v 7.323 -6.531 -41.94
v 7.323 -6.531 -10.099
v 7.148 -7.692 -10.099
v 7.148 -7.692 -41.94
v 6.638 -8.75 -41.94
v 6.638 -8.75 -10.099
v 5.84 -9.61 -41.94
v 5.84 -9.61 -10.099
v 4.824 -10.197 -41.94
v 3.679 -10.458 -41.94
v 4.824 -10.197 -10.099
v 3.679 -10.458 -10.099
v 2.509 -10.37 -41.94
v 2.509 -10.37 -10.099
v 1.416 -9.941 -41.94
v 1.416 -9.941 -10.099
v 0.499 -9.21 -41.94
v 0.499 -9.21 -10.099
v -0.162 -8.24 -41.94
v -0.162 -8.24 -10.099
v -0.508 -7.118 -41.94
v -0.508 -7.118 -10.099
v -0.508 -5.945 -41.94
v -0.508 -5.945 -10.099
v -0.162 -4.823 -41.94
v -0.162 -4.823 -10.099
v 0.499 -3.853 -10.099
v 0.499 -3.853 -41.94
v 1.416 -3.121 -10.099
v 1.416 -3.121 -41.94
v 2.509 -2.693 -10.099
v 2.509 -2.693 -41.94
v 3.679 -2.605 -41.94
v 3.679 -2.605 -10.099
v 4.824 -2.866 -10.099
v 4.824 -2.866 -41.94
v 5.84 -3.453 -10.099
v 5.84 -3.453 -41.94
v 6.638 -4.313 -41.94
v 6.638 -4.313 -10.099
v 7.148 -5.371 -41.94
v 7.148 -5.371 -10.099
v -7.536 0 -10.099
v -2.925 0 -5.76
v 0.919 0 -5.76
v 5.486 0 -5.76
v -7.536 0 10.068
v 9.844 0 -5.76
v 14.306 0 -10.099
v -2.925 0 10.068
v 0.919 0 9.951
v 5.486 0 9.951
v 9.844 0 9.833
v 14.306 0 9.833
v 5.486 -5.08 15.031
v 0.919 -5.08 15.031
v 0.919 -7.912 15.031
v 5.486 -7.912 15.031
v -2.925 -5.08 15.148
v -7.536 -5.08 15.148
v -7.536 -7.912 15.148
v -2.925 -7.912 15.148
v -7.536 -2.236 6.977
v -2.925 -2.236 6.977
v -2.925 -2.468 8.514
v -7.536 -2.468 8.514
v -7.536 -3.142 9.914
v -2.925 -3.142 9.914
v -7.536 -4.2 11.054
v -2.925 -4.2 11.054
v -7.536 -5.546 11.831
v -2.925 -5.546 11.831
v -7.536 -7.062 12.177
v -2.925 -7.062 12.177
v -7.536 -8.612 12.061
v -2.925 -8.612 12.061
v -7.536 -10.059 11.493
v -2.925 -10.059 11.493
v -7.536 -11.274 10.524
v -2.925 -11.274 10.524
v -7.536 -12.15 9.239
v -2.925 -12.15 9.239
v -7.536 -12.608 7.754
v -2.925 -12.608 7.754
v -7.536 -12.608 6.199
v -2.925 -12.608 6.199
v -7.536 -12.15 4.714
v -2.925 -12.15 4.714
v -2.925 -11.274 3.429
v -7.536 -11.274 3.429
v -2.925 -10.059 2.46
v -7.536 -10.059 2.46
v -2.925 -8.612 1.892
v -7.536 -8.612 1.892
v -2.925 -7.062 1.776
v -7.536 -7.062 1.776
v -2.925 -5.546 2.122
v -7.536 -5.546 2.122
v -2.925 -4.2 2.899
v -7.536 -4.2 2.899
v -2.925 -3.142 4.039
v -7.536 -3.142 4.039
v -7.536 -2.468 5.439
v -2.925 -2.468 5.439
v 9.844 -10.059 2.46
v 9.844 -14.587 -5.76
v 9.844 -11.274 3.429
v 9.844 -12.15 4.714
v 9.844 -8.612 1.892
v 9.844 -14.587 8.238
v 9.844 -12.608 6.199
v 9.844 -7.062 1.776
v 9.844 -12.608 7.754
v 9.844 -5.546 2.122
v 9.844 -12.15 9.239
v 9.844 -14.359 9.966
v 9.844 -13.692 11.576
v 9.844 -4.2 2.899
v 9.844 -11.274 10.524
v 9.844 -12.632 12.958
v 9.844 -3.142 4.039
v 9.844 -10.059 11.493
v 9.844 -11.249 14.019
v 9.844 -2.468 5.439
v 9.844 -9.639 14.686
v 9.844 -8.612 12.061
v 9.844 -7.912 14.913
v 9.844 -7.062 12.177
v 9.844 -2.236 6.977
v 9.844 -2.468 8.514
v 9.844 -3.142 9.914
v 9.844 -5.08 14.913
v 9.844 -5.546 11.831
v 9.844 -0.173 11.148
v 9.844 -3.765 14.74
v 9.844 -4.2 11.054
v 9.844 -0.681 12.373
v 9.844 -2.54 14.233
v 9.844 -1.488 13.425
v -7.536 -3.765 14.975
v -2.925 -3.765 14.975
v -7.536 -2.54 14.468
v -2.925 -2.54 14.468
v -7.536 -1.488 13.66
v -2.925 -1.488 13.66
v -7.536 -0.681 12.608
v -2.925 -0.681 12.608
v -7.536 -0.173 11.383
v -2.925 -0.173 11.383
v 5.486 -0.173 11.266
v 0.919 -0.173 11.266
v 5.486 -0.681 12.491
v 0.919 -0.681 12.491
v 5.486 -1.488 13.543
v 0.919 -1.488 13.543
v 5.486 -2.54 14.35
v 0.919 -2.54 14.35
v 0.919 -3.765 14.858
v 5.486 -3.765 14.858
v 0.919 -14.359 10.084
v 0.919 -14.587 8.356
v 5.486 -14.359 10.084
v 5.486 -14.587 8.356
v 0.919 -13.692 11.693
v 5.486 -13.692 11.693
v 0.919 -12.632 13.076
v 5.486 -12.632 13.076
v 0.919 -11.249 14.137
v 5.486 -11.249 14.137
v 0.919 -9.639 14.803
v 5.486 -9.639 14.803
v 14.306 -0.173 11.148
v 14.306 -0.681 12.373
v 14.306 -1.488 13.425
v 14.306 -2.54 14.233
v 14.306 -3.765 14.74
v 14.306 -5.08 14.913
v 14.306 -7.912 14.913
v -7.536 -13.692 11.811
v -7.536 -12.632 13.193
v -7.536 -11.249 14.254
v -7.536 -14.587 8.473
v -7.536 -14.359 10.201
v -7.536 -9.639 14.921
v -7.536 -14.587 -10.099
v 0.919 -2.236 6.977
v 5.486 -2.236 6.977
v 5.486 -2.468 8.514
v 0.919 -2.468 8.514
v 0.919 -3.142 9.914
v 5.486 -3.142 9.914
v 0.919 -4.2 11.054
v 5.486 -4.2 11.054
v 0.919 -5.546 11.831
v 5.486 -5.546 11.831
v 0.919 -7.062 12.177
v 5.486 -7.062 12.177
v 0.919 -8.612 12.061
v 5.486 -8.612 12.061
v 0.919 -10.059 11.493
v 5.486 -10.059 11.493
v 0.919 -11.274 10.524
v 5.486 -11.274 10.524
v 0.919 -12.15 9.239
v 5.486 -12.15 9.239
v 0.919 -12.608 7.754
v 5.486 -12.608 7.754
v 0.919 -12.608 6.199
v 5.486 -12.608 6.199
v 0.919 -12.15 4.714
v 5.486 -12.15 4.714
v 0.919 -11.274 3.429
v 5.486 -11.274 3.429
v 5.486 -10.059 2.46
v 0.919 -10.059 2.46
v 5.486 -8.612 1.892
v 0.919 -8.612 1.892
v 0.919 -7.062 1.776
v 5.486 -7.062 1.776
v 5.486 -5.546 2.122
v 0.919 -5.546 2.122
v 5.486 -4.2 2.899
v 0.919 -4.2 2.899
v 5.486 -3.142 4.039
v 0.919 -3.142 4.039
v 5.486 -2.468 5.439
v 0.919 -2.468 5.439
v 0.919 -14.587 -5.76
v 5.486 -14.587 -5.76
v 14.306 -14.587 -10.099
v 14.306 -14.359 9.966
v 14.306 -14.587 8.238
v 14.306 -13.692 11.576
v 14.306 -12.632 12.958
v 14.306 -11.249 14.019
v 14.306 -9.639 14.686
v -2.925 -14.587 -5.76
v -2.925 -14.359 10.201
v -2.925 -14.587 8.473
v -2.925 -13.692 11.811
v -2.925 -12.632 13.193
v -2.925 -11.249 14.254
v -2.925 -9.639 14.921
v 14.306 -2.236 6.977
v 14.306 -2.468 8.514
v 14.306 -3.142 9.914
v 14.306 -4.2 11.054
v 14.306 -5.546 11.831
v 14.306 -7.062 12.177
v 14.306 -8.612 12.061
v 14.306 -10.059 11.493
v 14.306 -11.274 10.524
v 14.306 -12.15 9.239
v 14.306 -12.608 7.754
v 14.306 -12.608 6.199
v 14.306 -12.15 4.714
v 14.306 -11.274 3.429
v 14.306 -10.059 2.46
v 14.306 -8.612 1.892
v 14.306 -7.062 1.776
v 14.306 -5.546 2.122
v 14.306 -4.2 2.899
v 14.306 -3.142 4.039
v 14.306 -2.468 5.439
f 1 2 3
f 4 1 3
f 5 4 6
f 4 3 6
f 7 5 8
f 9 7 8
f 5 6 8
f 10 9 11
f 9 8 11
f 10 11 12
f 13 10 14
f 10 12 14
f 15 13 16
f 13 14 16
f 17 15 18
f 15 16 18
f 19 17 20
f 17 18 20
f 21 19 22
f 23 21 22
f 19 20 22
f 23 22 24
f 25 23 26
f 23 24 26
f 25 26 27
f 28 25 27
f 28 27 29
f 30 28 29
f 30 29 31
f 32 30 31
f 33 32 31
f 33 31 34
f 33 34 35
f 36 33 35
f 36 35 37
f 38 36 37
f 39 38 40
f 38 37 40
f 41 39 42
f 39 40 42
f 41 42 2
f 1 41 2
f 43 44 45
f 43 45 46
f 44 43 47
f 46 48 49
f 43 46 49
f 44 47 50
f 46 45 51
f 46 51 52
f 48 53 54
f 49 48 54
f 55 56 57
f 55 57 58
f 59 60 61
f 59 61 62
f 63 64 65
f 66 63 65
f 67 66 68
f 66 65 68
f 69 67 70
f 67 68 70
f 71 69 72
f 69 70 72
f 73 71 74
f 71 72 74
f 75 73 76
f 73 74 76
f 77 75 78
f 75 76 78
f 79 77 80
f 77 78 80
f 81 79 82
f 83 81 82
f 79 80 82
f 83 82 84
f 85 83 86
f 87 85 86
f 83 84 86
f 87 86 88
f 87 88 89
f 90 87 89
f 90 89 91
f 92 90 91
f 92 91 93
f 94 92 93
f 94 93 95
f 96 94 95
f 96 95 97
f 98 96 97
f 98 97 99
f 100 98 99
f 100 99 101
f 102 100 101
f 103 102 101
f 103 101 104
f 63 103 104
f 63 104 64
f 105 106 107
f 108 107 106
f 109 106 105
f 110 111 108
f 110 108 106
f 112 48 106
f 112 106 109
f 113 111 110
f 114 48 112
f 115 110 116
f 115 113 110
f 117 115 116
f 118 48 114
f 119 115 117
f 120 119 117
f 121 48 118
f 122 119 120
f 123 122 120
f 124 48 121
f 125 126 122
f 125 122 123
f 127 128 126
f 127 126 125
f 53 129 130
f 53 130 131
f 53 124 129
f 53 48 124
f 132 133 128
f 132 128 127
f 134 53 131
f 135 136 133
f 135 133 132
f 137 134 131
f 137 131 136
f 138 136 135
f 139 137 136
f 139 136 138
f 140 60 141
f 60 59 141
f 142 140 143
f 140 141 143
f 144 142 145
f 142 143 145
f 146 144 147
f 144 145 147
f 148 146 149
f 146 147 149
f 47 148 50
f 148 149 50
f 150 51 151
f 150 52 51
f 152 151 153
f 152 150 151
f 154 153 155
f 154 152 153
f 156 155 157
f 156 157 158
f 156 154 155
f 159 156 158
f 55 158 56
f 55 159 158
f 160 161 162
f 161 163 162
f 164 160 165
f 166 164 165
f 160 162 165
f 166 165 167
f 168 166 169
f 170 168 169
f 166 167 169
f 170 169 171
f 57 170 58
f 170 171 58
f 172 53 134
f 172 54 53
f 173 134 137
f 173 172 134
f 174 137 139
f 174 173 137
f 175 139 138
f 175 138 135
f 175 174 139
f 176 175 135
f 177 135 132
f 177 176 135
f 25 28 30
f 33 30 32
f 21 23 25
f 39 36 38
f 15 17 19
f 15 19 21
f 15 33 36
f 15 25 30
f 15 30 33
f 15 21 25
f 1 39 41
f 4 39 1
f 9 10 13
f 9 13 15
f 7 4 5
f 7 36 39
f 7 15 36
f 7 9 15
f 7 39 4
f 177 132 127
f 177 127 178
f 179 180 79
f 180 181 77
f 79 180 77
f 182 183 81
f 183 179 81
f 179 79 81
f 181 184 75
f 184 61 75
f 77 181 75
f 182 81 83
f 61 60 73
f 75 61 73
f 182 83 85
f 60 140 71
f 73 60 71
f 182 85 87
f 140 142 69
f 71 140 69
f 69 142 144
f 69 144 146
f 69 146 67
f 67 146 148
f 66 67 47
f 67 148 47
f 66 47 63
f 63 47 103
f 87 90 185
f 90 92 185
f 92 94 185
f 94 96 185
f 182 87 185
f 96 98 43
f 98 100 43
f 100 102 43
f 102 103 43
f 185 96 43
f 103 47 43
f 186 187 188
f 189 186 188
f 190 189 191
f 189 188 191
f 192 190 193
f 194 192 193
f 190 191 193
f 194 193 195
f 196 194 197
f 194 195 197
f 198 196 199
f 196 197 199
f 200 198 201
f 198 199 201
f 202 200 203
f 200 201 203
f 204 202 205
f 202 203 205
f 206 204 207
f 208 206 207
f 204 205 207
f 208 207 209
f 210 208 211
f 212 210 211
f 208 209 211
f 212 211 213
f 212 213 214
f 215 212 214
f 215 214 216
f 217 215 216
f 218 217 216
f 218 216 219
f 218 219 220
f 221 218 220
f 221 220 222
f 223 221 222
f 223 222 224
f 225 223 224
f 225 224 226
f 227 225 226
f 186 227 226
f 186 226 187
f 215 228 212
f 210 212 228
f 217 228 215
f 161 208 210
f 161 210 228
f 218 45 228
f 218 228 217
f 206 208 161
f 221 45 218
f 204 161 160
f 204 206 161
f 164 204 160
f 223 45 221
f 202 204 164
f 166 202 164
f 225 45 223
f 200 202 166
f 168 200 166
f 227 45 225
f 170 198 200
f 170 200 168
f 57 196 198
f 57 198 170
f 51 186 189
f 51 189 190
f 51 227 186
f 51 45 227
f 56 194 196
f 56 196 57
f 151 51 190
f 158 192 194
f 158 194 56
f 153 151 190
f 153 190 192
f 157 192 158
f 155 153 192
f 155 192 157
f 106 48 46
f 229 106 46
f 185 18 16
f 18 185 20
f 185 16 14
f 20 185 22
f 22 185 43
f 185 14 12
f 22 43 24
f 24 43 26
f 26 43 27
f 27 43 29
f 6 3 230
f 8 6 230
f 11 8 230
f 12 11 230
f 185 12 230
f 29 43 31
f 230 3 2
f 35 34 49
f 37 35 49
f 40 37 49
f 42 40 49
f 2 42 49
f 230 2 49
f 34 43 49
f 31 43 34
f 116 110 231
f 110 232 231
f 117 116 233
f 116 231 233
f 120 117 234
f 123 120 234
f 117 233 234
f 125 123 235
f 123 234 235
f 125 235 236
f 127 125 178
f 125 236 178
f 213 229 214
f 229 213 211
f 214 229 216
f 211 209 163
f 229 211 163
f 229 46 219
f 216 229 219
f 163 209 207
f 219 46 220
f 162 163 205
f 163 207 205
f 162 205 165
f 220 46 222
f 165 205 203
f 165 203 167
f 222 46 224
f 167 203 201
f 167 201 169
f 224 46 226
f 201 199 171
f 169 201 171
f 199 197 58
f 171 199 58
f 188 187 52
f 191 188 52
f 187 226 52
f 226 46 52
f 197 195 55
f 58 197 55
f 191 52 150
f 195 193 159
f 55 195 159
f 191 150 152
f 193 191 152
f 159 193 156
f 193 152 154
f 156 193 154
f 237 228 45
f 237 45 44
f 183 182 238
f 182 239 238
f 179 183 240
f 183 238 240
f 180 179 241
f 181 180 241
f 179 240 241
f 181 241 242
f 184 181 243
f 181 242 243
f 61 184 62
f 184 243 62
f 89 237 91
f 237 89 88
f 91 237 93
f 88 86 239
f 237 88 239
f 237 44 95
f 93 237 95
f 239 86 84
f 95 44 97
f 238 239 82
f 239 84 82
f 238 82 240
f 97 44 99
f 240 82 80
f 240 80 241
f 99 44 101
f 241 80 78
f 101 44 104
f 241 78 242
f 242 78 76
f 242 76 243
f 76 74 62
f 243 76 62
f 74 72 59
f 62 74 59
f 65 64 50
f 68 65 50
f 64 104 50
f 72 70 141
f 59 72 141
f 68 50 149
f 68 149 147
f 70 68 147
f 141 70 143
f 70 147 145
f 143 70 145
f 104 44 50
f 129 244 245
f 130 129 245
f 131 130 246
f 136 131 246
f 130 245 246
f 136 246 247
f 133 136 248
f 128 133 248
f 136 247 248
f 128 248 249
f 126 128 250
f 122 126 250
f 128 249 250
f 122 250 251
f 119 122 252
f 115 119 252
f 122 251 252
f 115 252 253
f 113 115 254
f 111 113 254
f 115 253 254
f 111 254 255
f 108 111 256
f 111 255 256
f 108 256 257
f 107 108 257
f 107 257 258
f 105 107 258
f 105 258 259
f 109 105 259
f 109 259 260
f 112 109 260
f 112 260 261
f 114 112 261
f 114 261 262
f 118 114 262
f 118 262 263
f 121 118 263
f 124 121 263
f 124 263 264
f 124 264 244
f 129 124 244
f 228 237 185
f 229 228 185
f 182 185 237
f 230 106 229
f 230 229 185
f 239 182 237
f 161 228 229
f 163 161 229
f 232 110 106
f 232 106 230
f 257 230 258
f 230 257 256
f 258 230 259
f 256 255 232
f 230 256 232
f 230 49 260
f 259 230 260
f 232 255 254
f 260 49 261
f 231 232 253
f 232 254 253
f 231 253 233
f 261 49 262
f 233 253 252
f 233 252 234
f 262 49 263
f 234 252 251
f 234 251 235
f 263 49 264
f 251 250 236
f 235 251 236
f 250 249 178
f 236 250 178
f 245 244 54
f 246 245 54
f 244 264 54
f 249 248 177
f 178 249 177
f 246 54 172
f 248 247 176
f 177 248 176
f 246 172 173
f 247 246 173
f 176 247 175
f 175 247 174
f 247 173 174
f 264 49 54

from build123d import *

# Parameters (mm, degrees)
F0_W     = 4.6103289351
F0_H     = 4.3393736705
F0_W_2   = 3.8445899263
F0_H_2   = 20.9079552442
F0_W_3   = 4.5673176646
F0_H_3   = 20.7905257121
F0_W_4   = 4.3573188595
F0_W_5   = 4.4623203576
F0_H_4   = 20.6730971113
F1_DEPTH = 14.58655
F2_R     = 5.2152852963
F3_DEPTH = 26.42732
F4_R     = 6.6748900837
F5_R     = 5.08
F6_R     = 3.9375516614
F7_DEPTH = 31.84089


with BuildPart() as f1:
    # F0 (on Front) → F1 (new body)
    with BuildSketch(Plane.XZ):
        with Locations((-5.2306521684, -7.9293963499)):
            Rectangle(F0_W, F0_H)
        with Locations((-1.0031927377, -7.9293963499)):
            Rectangle(F0_W_2, F0_H)
        with Locations((-5.2306521684, 4.6942681074)):
            Rectangle(F0_W, F0_H_2)
        with Locations((3.2027610578, -7.9293963499)):
            Rectangle(F0_W_3, F0_H)
        with Locations((3.2027610578, 4.6355533414)):
            Rectangle(F0_W_3, F0_H_3)
        with Locations((7.6650793198, -7.9293963499)):
            Rectangle(F0_W_4, F0_H)
        with Locations((12.0748989284, -7.9293963499)):
            Rectangle(F0_W_5, F0_H)
        with Locations((12.0748989284, 4.576839041)):
            Rectangle(F0_W_5, F0_H_4)
    extrude(amount=F1_DEPTH)

    # F2 (on face) → F3 (cut)
    with BuildSketch(Plane.YZ.offset(14.3060591072)):
        with Locations((-7.4513442814, 6.9766114466)):
            Circle(F2_R)
    extrude(amount=-F3_DEPTH, mode=Mode.SUBTRACT)

    # F4
    f4_edges = [f1.edges().sort_by_distance(p)[0] for p in [
        (-5.230652, -14.58655, 15.148246),
        (3.202761, -14.58655, 15.030816),
        (12.074899, -14.58655, 14.913388),
    ]]
    fillet(f4_edges, radius=F4_R)

    # F5
    f5_edges = [f1.edges().sort_by_distance(p)[0] for p in [
        (12.074899, 0, 14.913388),
        (3.202761, 0, 15.030816),
        (-5.230652, 0, 15.148246),
    ]]
    fillet(f5_edges, radius=F5_R)

    # F6 (on face) → F7 (join)
    with BuildSketch(Plane(origin=(0, 0, -10.0990831852), x_dir=(1, 0, 0), z_dir=(0, 0, -1))):
        with Locations((3.3851212356, 6.5314560197)):
            Circle(F6_R)
    extrude(amount=F7_DEPTH)


solid = f1.part
